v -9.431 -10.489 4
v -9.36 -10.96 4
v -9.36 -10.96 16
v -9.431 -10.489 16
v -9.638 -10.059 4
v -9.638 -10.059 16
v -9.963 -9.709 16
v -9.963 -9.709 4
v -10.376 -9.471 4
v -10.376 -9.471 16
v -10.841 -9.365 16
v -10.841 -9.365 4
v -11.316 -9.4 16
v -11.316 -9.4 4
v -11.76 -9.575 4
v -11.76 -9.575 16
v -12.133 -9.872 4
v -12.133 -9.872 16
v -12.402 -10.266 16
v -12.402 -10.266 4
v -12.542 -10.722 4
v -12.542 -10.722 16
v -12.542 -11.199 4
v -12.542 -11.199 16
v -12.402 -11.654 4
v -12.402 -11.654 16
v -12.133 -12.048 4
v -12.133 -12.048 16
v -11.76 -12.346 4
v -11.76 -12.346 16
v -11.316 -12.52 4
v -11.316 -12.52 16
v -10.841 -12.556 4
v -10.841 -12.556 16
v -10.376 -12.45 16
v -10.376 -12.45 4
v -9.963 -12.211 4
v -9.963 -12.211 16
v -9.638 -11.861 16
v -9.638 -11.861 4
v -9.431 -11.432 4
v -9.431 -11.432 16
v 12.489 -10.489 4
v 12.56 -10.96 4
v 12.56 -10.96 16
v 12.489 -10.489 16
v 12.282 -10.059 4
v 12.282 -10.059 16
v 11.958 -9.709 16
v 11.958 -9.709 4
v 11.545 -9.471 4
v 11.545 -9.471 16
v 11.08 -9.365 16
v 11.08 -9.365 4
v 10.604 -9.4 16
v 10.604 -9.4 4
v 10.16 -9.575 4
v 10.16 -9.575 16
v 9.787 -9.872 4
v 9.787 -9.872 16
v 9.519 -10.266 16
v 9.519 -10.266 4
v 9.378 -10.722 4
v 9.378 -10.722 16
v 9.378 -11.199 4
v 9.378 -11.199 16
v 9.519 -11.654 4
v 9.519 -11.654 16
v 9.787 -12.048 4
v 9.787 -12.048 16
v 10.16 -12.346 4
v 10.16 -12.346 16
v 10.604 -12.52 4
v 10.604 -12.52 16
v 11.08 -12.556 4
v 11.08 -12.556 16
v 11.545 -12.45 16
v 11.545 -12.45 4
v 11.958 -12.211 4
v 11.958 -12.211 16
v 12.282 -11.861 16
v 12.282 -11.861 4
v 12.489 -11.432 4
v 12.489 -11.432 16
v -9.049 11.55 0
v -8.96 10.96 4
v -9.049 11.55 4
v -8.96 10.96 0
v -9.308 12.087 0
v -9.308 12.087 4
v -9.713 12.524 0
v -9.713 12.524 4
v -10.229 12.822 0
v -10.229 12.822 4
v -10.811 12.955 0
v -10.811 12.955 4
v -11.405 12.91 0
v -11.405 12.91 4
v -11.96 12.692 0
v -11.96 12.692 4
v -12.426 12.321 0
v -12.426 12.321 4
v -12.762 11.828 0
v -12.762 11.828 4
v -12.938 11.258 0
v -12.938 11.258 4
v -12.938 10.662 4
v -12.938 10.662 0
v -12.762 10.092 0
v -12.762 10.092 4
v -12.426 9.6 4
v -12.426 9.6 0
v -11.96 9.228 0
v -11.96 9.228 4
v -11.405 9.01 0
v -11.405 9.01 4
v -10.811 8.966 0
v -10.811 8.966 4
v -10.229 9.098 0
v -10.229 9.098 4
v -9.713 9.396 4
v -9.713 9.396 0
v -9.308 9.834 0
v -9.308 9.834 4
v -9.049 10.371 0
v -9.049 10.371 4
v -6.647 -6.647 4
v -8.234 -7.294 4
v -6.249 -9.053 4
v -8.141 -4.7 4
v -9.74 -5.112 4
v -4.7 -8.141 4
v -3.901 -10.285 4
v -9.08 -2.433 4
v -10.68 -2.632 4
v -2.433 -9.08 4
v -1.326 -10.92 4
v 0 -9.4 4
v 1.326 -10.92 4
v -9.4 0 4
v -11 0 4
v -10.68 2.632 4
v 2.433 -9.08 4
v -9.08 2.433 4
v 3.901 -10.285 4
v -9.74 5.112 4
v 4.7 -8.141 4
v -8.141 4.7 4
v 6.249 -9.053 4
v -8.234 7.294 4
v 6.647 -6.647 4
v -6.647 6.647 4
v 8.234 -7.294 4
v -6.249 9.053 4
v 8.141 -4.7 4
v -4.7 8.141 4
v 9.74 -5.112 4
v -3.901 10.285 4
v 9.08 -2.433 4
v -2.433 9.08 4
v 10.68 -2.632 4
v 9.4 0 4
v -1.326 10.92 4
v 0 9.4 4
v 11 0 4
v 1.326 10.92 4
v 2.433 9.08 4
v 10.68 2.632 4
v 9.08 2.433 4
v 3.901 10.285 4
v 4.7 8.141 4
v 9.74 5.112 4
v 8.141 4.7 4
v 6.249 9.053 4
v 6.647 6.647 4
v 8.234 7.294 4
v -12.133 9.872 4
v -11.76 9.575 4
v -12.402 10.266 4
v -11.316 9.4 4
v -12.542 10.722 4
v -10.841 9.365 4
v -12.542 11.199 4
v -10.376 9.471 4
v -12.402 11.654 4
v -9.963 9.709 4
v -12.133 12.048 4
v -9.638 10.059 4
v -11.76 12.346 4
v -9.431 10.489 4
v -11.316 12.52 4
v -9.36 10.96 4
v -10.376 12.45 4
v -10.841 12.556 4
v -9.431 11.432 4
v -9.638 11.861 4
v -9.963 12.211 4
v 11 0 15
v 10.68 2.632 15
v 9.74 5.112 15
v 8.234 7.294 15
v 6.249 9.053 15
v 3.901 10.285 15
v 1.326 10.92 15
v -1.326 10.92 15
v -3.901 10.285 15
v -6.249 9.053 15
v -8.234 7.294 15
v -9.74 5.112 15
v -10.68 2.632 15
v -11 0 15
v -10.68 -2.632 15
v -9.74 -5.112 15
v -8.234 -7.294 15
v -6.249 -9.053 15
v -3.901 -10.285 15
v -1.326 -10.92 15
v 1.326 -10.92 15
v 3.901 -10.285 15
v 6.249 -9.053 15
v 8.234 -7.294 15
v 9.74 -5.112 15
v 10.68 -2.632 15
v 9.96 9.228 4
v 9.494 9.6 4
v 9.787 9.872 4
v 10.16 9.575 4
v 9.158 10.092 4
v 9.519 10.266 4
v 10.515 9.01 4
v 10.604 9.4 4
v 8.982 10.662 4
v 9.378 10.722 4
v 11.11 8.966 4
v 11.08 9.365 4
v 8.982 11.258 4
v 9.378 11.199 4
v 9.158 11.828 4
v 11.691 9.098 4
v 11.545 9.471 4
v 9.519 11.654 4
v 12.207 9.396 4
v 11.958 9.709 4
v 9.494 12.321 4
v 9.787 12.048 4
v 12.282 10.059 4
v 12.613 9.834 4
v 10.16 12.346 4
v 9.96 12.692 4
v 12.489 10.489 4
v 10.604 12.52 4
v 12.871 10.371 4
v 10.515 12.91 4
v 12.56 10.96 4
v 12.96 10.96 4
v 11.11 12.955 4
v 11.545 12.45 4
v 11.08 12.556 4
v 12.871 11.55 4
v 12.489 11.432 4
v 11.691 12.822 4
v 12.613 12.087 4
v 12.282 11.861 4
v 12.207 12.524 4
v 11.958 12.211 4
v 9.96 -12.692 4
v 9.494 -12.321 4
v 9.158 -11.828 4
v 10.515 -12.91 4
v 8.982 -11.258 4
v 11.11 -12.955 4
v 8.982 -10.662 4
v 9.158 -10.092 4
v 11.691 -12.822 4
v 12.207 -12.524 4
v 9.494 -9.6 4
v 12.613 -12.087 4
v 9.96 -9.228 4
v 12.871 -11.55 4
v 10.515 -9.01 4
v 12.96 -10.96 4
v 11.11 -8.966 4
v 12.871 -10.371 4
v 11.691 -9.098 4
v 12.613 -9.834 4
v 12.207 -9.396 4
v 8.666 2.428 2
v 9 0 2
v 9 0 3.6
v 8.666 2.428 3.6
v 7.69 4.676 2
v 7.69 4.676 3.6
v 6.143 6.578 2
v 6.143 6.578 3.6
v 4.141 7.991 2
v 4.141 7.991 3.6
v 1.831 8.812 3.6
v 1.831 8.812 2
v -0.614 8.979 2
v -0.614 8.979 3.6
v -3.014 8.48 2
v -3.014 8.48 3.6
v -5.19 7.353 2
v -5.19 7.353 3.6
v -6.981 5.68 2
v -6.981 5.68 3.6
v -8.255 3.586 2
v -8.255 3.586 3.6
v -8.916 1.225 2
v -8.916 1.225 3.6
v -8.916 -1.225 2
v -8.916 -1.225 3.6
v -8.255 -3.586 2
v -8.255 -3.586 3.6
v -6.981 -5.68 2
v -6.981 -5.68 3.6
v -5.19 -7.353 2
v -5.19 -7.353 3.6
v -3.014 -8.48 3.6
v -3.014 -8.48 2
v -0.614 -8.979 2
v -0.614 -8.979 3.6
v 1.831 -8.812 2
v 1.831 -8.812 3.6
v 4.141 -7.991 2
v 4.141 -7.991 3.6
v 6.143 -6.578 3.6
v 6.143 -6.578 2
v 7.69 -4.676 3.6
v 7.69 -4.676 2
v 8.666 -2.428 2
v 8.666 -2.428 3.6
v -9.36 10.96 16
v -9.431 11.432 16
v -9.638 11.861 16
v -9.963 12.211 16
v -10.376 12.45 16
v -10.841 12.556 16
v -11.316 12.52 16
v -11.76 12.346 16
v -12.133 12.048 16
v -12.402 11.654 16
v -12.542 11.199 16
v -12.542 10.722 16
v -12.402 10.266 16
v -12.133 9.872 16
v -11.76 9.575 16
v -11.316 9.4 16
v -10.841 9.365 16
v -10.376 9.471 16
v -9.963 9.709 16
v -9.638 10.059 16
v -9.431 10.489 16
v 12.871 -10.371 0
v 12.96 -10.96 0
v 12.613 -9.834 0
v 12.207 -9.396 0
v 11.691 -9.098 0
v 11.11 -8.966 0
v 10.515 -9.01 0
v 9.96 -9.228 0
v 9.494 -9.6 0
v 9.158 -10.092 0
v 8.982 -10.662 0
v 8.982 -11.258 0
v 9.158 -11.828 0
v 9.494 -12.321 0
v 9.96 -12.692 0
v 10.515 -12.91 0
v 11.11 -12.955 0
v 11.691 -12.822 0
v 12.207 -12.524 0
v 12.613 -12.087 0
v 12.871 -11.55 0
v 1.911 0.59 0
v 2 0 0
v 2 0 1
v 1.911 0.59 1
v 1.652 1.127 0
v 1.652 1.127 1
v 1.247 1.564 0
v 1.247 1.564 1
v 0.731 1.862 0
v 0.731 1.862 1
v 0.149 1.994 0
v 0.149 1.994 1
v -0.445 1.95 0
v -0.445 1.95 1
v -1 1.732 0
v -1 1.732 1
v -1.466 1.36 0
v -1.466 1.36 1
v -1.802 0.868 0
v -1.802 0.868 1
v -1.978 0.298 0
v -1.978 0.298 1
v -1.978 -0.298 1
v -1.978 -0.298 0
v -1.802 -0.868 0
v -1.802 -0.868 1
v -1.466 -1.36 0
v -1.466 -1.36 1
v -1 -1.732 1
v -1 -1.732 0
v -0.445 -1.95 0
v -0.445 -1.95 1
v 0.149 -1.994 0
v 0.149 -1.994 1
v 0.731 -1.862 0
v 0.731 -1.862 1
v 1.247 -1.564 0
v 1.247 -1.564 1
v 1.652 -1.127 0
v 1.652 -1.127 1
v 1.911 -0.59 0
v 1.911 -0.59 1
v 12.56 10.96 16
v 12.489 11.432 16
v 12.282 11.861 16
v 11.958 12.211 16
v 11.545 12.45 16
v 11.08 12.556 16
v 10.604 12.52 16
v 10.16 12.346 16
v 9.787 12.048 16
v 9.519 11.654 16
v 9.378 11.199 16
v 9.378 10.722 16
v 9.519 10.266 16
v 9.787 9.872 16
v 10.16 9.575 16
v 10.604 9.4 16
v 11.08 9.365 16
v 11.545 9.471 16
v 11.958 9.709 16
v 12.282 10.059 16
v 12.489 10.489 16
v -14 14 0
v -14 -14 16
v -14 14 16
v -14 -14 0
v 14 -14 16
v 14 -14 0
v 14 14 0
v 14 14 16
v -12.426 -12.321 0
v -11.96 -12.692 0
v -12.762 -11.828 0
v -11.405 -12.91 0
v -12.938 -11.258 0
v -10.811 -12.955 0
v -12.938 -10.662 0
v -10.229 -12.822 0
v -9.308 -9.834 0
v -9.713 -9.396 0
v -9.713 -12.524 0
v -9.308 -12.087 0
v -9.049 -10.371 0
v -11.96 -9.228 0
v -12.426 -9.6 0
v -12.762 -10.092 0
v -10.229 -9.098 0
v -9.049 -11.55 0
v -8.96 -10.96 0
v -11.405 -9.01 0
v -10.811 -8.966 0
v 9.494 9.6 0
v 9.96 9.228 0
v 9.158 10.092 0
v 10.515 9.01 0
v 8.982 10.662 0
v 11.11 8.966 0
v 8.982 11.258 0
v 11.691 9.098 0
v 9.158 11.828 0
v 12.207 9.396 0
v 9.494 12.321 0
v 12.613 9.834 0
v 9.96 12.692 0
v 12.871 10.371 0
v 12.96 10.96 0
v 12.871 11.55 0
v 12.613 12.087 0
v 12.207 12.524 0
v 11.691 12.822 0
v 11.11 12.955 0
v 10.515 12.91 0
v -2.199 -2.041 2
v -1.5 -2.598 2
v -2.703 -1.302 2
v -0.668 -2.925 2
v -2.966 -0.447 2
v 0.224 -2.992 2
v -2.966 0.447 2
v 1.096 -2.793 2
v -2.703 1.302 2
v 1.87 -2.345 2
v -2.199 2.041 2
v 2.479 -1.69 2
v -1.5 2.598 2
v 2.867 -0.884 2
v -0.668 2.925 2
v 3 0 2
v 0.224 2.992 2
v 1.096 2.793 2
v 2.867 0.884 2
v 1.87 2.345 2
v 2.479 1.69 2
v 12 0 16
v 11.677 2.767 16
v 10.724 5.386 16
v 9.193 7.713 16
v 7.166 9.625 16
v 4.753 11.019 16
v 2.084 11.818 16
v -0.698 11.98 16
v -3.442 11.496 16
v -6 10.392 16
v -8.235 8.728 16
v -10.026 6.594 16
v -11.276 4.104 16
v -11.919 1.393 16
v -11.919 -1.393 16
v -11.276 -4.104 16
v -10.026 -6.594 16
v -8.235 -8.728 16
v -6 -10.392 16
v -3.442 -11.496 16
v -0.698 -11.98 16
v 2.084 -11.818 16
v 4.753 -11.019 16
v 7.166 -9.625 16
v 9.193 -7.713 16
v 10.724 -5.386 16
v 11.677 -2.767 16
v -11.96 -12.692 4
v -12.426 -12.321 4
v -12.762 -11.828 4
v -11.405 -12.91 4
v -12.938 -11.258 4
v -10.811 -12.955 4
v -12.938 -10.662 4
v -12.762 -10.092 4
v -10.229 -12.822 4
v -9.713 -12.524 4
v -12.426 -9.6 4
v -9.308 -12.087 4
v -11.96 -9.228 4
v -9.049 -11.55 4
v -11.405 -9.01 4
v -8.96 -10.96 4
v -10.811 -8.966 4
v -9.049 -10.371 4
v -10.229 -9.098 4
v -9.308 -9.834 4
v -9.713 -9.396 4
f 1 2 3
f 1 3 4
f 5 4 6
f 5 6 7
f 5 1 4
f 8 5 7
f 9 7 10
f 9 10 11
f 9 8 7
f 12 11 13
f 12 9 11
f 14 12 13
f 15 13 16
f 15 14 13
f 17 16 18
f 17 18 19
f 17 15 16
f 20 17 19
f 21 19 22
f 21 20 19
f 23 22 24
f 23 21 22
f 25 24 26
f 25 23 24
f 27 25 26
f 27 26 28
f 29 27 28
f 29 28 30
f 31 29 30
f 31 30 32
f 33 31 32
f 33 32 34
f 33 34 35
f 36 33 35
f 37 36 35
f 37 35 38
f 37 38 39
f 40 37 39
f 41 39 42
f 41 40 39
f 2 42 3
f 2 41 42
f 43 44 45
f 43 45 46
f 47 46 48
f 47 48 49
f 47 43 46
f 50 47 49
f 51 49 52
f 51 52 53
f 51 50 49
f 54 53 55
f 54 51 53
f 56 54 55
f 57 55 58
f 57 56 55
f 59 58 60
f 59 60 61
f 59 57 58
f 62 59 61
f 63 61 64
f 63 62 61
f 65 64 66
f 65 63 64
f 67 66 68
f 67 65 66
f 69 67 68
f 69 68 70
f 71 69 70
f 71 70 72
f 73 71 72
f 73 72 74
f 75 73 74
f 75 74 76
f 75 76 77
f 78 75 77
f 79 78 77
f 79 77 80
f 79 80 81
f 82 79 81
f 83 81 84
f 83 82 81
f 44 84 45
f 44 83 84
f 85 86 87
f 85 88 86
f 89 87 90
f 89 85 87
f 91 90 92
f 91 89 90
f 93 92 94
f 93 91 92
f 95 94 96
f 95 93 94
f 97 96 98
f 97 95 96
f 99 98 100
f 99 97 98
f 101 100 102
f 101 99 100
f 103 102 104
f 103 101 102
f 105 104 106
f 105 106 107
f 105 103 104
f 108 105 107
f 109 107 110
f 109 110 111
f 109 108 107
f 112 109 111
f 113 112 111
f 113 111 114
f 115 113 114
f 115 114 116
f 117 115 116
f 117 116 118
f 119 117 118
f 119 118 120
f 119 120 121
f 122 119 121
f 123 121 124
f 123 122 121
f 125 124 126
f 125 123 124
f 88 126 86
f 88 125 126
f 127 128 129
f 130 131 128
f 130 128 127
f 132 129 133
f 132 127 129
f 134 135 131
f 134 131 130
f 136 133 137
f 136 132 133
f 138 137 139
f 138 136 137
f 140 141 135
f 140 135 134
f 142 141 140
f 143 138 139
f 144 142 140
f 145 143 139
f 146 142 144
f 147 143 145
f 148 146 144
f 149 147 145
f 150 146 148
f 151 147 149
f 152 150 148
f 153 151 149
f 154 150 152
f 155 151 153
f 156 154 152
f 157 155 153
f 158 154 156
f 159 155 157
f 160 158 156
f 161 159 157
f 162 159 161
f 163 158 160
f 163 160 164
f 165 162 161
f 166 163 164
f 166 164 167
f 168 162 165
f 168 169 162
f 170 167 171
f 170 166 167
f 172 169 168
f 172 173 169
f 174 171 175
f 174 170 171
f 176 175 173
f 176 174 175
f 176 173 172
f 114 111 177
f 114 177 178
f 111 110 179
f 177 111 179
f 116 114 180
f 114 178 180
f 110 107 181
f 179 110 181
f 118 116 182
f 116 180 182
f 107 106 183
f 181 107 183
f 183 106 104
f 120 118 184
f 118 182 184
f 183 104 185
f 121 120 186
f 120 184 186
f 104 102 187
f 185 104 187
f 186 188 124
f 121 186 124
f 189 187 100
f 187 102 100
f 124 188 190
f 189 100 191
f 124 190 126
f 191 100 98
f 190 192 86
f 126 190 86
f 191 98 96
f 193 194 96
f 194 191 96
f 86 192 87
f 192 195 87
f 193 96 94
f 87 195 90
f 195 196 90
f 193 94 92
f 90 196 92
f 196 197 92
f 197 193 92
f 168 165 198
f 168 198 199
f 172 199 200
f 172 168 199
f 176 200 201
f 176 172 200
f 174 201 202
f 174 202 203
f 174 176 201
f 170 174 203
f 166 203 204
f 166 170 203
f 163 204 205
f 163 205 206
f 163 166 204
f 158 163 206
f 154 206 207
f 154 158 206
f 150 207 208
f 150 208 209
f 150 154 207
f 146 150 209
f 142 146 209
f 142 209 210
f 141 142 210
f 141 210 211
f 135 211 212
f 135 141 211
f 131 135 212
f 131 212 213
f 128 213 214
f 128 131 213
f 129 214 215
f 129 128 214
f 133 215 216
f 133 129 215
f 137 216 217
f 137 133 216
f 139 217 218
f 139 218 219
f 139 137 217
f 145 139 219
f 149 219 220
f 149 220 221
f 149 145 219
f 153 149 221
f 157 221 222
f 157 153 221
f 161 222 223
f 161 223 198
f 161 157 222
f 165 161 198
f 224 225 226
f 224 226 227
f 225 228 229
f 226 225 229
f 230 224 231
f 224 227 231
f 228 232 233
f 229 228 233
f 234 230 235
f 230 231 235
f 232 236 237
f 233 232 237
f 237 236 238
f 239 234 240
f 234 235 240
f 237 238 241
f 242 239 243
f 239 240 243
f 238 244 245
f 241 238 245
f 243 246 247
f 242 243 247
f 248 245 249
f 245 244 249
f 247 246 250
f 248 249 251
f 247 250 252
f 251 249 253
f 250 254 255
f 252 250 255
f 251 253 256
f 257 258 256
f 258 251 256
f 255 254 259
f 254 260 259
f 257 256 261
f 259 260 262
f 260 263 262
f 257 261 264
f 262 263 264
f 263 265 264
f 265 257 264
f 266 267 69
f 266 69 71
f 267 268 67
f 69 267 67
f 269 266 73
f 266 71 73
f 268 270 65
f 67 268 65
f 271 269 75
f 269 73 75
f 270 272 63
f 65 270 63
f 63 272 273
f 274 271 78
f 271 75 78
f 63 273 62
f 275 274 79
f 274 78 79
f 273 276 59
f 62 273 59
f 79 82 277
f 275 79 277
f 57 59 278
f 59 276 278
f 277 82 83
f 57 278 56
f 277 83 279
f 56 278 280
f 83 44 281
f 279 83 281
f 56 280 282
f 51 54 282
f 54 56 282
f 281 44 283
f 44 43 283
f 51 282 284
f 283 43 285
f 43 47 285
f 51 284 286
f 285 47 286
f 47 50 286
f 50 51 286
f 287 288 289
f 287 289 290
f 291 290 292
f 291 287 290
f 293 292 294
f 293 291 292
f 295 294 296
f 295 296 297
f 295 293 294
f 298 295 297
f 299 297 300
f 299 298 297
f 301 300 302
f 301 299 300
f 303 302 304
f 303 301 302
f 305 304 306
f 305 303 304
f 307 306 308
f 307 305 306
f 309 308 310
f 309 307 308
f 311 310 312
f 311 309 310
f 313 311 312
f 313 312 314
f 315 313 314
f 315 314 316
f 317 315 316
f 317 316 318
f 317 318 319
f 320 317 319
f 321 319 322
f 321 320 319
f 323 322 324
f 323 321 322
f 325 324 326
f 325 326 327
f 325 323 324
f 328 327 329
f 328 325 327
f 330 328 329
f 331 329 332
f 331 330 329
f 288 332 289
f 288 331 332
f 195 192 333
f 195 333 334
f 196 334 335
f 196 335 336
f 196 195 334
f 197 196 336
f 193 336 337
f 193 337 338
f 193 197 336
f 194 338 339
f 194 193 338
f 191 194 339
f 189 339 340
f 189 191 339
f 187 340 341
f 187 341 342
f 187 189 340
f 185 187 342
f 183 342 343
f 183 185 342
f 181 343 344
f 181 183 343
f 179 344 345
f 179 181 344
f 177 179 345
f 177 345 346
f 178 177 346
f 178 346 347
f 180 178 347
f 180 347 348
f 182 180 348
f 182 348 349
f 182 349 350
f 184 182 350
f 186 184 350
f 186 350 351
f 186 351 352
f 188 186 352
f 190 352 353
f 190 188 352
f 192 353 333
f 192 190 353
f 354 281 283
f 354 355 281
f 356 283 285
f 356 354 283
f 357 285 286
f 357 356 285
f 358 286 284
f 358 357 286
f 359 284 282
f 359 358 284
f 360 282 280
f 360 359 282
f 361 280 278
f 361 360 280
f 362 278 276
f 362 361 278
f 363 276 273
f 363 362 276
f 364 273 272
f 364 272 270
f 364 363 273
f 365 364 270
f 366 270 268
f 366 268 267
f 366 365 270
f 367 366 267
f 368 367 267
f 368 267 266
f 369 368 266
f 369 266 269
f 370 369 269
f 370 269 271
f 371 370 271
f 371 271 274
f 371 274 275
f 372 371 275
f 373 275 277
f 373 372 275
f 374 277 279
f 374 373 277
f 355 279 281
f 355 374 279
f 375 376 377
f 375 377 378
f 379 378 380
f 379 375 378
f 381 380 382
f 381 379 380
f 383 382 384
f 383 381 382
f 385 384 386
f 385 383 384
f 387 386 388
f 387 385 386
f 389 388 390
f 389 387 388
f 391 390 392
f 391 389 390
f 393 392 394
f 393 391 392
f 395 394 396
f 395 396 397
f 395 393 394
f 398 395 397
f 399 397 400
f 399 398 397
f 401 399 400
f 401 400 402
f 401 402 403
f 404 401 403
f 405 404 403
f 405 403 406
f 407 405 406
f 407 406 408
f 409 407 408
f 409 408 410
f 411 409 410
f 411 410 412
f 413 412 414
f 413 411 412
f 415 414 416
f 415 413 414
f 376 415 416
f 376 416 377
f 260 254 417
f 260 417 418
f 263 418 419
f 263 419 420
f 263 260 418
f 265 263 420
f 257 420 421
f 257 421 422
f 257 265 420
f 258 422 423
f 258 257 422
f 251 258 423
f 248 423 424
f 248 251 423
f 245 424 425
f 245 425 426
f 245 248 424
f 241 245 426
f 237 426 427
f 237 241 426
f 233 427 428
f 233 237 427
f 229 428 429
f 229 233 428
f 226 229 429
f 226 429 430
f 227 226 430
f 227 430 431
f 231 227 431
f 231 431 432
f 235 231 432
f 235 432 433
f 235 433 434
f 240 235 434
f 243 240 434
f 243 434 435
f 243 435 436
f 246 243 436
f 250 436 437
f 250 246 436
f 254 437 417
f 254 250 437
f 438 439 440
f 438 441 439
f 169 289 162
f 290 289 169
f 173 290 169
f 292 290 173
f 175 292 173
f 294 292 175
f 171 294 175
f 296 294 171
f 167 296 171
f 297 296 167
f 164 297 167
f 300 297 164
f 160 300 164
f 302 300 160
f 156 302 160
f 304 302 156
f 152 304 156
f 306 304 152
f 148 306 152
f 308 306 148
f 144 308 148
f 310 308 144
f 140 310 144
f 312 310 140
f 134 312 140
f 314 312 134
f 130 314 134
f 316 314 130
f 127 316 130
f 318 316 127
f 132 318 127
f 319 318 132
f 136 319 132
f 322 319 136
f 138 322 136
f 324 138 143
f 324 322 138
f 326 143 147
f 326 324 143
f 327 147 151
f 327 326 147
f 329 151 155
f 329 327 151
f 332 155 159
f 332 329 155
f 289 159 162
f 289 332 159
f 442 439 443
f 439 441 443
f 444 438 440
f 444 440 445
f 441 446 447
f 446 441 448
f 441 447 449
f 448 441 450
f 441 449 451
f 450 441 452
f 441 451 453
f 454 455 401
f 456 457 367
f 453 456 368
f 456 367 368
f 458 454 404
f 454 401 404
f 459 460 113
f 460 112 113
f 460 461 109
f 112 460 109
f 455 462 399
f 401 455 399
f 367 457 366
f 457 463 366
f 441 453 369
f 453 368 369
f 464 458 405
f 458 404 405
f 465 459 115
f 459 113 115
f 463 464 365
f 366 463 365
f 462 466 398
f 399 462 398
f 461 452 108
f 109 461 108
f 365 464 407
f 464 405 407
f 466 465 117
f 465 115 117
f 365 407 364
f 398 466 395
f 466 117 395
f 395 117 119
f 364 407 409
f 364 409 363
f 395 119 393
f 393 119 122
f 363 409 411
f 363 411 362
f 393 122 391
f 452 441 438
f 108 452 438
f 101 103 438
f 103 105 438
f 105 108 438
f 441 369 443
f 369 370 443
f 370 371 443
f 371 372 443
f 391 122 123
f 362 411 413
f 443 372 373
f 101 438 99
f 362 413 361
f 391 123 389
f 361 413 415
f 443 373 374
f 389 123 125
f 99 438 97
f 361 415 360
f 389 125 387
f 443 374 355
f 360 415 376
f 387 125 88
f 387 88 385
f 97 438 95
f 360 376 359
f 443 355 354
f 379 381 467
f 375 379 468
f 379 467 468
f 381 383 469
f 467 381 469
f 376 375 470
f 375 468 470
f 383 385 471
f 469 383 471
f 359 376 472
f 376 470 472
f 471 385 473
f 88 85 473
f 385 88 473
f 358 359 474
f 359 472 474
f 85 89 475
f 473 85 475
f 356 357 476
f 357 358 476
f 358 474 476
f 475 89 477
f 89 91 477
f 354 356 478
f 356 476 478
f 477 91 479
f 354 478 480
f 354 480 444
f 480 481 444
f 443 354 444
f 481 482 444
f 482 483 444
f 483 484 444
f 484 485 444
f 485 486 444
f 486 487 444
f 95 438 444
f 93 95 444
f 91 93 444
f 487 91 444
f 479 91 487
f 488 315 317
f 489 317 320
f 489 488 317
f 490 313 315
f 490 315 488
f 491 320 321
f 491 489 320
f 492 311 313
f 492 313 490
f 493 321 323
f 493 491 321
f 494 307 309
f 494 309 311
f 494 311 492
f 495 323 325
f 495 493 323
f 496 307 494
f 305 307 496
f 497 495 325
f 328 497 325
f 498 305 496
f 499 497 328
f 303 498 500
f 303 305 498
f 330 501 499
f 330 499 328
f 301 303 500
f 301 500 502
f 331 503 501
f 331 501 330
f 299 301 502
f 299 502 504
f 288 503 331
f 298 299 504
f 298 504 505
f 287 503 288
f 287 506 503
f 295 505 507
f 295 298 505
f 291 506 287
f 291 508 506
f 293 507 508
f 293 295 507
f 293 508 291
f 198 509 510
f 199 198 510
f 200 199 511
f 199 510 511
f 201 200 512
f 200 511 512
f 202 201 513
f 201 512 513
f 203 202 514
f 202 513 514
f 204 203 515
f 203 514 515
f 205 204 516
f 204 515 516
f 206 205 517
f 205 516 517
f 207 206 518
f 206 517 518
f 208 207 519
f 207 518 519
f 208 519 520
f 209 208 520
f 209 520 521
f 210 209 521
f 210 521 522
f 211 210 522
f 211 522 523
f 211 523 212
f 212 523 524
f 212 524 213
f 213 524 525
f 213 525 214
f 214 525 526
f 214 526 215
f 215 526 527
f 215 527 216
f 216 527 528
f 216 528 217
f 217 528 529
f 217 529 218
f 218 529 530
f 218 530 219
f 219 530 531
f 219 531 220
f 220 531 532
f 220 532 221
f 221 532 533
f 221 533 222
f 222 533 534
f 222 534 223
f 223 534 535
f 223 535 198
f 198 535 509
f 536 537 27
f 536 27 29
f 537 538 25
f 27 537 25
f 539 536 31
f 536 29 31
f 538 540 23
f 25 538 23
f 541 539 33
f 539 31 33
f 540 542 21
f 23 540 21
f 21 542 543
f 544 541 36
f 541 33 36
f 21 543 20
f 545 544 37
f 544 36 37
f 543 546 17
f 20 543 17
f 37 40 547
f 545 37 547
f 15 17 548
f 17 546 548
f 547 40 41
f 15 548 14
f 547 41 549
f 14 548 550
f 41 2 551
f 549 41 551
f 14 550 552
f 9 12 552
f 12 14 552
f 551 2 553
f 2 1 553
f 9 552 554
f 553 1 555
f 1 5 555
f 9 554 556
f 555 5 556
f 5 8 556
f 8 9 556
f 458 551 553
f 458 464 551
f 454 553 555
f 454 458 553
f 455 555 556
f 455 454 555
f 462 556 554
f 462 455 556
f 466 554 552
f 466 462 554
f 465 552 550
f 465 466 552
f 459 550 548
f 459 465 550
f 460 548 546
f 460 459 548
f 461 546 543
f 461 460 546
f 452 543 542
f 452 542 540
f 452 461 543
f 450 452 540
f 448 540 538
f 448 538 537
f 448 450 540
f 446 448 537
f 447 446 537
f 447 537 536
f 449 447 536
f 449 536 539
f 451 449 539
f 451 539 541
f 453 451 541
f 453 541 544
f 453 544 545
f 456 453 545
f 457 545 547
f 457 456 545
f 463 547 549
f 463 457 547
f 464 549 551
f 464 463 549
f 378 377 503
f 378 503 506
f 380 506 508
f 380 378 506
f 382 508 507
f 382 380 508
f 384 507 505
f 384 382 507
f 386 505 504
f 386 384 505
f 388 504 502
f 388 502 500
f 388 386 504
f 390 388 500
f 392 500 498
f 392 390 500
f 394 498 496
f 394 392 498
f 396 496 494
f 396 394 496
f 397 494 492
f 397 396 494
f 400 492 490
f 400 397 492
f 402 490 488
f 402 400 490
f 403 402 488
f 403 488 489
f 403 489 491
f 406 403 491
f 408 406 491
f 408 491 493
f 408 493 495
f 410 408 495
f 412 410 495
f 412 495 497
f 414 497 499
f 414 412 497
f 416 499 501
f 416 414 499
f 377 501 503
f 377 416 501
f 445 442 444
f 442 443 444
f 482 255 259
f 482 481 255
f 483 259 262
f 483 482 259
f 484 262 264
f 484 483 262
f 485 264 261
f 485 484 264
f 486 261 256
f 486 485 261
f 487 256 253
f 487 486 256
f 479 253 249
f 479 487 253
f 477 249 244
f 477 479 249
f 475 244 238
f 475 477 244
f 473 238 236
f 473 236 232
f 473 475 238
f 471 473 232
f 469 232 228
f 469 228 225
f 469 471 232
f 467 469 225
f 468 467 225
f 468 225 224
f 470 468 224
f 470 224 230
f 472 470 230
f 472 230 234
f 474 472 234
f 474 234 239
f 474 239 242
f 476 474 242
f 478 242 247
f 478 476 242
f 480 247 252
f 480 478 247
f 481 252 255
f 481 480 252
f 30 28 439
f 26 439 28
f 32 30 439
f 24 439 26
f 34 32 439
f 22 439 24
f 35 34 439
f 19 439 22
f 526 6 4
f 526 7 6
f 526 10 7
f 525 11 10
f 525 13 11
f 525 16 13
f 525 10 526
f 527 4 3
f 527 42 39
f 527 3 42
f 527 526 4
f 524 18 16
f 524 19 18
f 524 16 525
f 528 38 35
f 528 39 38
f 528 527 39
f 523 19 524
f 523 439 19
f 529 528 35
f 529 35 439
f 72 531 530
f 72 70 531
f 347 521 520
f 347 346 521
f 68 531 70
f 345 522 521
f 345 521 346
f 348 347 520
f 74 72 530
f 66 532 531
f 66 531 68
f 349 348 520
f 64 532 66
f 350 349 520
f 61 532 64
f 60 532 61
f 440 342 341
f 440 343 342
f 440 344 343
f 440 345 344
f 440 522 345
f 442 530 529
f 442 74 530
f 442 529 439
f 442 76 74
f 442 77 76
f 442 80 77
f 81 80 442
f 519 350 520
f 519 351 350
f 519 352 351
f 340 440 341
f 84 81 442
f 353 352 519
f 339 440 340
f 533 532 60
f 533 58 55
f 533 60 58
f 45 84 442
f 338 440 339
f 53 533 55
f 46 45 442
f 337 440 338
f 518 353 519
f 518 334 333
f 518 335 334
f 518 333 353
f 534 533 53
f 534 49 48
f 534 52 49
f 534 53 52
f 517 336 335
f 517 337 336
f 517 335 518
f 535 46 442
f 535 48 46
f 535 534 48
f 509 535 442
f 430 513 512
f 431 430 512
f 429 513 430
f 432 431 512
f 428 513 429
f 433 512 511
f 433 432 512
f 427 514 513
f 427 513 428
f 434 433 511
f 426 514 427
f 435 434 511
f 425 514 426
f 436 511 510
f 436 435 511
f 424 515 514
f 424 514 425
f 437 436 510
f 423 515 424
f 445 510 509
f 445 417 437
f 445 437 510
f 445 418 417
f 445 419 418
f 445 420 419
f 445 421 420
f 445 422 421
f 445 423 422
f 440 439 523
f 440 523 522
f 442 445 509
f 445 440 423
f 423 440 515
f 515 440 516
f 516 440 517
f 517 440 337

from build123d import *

# Parameters (mm, degrees)
SKETCH_W        = 28
SKETCH_H        = 28
SKETCH_R        = 2
PAD_DEPTH       = 2
SKETCH001_W     = 28
SKETCH001_H     = 28
SKETCH001_R     = 9
SKETCH001_R_2   = 2
PAD001_DEPTH    = 2
SKETCH003_W     = 28
SKETCH003_H     = 28
SKETCH003_R     = 1.6
SKETCH003_R_2   = 11
PAD002_DEPTH    = 12
CHAMFER_SIZE    = 1
CHAMFER001_SIZE = 0.4
CHAMFER002_SIZE = 1


with BuildPart() as part:
    # Sketch → Pad (new body)
    with BuildSketch(Plane.XY):
        Rectangle(SKETCH_W, SKETCH_H)
        Circle(SKETCH_R, mode=Mode.SUBTRACT)
        with Locations((10.960155, 10.960155)):
            Circle(SKETCH_R, mode=Mode.SUBTRACT)
        with Locations((-10.960155, 10.960155)):
            Circle(SKETCH_R, mode=Mode.SUBTRACT)
        with Locations((-10.960155, -10.960155)):
            Circle(SKETCH_R, mode=Mode.SUBTRACT)
        with Locations((10.960155, -10.960155)):
            Circle(SKETCH_R, mode=Mode.SUBTRACT)
    extrude(amount=PAD_DEPTH)

    # Sketch001 (on Face11 of Pad) → Pad001 (join)
    with BuildSketch(Plane.XY.offset(2)):
        Rectangle(SKETCH001_W, SKETCH001_H)
        Circle(SKETCH001_R, mode=Mode.SUBTRACT)
        with Locations((-10.960155, 10.960155)):
            Circle(SKETCH001_R_2, mode=Mode.SUBTRACT)
        with Locations((-10.960155, -10.960155)):
            Circle(SKETCH001_R_2, mode=Mode.SUBTRACT)
        with Locations((10.960155, -10.960155)):
            Circle(SKETCH001_R_2, mode=Mode.SUBTRACT)
        with Locations((10.960155, 10.960155)):
            Circle(SKETCH001_R_2, mode=Mode.SUBTRACT)
    extrude(amount=PAD001_DEPTH)

    # Sketch003 (on Face14 of Pad001) → Pad002 (join)
    with BuildSketch(Plane.XY.offset(4)):
        Rectangle(SKETCH003_W, SKETCH003_H)
        with Locations((-10.960155, 10.960155)):
            Circle(SKETCH003_R, mode=Mode.SUBTRACT)
        with Locations((-10.960155, -10.960155)):
            Circle(SKETCH003_R, mode=Mode.SUBTRACT)
        with Locations((10.960155, -10.960155)):
            Circle(SKETCH003_R, mode=Mode.SUBTRACT)
        with Locations((10.960155, 10.960155)):
            Circle(SKETCH003_R, mode=Mode.SUBTRACT)
        Circle(SKETCH003_R_2, mode=Mode.SUBTRACT)
    extrude(amount=PAD002_DEPTH)

    # Chamfer
    chamfer_edges = [part.edges().sort_by_distance(p)[0] for p in [
        (-11, 0, 16),
    ]]
    chamfer(chamfer_edges, length=CHAMFER_SIZE)

    # Chamfer001
    chamfer001_edges = [part.edges().sort_by_distance(p)[0] for p in [
        (-9, 0, 4),
    ]]
    chamfer(chamfer001_edges, length=CHAMFER001_SIZE)

    # Chamfer002
    chamfer002_edges = [part.edges().sort_by_distance(p)[0] for p in [
        (-2, 0, 2),
    ]]
    chamfer(chamfer002_edges, length=CHAMFER002_SIZE)


solid = part.part
